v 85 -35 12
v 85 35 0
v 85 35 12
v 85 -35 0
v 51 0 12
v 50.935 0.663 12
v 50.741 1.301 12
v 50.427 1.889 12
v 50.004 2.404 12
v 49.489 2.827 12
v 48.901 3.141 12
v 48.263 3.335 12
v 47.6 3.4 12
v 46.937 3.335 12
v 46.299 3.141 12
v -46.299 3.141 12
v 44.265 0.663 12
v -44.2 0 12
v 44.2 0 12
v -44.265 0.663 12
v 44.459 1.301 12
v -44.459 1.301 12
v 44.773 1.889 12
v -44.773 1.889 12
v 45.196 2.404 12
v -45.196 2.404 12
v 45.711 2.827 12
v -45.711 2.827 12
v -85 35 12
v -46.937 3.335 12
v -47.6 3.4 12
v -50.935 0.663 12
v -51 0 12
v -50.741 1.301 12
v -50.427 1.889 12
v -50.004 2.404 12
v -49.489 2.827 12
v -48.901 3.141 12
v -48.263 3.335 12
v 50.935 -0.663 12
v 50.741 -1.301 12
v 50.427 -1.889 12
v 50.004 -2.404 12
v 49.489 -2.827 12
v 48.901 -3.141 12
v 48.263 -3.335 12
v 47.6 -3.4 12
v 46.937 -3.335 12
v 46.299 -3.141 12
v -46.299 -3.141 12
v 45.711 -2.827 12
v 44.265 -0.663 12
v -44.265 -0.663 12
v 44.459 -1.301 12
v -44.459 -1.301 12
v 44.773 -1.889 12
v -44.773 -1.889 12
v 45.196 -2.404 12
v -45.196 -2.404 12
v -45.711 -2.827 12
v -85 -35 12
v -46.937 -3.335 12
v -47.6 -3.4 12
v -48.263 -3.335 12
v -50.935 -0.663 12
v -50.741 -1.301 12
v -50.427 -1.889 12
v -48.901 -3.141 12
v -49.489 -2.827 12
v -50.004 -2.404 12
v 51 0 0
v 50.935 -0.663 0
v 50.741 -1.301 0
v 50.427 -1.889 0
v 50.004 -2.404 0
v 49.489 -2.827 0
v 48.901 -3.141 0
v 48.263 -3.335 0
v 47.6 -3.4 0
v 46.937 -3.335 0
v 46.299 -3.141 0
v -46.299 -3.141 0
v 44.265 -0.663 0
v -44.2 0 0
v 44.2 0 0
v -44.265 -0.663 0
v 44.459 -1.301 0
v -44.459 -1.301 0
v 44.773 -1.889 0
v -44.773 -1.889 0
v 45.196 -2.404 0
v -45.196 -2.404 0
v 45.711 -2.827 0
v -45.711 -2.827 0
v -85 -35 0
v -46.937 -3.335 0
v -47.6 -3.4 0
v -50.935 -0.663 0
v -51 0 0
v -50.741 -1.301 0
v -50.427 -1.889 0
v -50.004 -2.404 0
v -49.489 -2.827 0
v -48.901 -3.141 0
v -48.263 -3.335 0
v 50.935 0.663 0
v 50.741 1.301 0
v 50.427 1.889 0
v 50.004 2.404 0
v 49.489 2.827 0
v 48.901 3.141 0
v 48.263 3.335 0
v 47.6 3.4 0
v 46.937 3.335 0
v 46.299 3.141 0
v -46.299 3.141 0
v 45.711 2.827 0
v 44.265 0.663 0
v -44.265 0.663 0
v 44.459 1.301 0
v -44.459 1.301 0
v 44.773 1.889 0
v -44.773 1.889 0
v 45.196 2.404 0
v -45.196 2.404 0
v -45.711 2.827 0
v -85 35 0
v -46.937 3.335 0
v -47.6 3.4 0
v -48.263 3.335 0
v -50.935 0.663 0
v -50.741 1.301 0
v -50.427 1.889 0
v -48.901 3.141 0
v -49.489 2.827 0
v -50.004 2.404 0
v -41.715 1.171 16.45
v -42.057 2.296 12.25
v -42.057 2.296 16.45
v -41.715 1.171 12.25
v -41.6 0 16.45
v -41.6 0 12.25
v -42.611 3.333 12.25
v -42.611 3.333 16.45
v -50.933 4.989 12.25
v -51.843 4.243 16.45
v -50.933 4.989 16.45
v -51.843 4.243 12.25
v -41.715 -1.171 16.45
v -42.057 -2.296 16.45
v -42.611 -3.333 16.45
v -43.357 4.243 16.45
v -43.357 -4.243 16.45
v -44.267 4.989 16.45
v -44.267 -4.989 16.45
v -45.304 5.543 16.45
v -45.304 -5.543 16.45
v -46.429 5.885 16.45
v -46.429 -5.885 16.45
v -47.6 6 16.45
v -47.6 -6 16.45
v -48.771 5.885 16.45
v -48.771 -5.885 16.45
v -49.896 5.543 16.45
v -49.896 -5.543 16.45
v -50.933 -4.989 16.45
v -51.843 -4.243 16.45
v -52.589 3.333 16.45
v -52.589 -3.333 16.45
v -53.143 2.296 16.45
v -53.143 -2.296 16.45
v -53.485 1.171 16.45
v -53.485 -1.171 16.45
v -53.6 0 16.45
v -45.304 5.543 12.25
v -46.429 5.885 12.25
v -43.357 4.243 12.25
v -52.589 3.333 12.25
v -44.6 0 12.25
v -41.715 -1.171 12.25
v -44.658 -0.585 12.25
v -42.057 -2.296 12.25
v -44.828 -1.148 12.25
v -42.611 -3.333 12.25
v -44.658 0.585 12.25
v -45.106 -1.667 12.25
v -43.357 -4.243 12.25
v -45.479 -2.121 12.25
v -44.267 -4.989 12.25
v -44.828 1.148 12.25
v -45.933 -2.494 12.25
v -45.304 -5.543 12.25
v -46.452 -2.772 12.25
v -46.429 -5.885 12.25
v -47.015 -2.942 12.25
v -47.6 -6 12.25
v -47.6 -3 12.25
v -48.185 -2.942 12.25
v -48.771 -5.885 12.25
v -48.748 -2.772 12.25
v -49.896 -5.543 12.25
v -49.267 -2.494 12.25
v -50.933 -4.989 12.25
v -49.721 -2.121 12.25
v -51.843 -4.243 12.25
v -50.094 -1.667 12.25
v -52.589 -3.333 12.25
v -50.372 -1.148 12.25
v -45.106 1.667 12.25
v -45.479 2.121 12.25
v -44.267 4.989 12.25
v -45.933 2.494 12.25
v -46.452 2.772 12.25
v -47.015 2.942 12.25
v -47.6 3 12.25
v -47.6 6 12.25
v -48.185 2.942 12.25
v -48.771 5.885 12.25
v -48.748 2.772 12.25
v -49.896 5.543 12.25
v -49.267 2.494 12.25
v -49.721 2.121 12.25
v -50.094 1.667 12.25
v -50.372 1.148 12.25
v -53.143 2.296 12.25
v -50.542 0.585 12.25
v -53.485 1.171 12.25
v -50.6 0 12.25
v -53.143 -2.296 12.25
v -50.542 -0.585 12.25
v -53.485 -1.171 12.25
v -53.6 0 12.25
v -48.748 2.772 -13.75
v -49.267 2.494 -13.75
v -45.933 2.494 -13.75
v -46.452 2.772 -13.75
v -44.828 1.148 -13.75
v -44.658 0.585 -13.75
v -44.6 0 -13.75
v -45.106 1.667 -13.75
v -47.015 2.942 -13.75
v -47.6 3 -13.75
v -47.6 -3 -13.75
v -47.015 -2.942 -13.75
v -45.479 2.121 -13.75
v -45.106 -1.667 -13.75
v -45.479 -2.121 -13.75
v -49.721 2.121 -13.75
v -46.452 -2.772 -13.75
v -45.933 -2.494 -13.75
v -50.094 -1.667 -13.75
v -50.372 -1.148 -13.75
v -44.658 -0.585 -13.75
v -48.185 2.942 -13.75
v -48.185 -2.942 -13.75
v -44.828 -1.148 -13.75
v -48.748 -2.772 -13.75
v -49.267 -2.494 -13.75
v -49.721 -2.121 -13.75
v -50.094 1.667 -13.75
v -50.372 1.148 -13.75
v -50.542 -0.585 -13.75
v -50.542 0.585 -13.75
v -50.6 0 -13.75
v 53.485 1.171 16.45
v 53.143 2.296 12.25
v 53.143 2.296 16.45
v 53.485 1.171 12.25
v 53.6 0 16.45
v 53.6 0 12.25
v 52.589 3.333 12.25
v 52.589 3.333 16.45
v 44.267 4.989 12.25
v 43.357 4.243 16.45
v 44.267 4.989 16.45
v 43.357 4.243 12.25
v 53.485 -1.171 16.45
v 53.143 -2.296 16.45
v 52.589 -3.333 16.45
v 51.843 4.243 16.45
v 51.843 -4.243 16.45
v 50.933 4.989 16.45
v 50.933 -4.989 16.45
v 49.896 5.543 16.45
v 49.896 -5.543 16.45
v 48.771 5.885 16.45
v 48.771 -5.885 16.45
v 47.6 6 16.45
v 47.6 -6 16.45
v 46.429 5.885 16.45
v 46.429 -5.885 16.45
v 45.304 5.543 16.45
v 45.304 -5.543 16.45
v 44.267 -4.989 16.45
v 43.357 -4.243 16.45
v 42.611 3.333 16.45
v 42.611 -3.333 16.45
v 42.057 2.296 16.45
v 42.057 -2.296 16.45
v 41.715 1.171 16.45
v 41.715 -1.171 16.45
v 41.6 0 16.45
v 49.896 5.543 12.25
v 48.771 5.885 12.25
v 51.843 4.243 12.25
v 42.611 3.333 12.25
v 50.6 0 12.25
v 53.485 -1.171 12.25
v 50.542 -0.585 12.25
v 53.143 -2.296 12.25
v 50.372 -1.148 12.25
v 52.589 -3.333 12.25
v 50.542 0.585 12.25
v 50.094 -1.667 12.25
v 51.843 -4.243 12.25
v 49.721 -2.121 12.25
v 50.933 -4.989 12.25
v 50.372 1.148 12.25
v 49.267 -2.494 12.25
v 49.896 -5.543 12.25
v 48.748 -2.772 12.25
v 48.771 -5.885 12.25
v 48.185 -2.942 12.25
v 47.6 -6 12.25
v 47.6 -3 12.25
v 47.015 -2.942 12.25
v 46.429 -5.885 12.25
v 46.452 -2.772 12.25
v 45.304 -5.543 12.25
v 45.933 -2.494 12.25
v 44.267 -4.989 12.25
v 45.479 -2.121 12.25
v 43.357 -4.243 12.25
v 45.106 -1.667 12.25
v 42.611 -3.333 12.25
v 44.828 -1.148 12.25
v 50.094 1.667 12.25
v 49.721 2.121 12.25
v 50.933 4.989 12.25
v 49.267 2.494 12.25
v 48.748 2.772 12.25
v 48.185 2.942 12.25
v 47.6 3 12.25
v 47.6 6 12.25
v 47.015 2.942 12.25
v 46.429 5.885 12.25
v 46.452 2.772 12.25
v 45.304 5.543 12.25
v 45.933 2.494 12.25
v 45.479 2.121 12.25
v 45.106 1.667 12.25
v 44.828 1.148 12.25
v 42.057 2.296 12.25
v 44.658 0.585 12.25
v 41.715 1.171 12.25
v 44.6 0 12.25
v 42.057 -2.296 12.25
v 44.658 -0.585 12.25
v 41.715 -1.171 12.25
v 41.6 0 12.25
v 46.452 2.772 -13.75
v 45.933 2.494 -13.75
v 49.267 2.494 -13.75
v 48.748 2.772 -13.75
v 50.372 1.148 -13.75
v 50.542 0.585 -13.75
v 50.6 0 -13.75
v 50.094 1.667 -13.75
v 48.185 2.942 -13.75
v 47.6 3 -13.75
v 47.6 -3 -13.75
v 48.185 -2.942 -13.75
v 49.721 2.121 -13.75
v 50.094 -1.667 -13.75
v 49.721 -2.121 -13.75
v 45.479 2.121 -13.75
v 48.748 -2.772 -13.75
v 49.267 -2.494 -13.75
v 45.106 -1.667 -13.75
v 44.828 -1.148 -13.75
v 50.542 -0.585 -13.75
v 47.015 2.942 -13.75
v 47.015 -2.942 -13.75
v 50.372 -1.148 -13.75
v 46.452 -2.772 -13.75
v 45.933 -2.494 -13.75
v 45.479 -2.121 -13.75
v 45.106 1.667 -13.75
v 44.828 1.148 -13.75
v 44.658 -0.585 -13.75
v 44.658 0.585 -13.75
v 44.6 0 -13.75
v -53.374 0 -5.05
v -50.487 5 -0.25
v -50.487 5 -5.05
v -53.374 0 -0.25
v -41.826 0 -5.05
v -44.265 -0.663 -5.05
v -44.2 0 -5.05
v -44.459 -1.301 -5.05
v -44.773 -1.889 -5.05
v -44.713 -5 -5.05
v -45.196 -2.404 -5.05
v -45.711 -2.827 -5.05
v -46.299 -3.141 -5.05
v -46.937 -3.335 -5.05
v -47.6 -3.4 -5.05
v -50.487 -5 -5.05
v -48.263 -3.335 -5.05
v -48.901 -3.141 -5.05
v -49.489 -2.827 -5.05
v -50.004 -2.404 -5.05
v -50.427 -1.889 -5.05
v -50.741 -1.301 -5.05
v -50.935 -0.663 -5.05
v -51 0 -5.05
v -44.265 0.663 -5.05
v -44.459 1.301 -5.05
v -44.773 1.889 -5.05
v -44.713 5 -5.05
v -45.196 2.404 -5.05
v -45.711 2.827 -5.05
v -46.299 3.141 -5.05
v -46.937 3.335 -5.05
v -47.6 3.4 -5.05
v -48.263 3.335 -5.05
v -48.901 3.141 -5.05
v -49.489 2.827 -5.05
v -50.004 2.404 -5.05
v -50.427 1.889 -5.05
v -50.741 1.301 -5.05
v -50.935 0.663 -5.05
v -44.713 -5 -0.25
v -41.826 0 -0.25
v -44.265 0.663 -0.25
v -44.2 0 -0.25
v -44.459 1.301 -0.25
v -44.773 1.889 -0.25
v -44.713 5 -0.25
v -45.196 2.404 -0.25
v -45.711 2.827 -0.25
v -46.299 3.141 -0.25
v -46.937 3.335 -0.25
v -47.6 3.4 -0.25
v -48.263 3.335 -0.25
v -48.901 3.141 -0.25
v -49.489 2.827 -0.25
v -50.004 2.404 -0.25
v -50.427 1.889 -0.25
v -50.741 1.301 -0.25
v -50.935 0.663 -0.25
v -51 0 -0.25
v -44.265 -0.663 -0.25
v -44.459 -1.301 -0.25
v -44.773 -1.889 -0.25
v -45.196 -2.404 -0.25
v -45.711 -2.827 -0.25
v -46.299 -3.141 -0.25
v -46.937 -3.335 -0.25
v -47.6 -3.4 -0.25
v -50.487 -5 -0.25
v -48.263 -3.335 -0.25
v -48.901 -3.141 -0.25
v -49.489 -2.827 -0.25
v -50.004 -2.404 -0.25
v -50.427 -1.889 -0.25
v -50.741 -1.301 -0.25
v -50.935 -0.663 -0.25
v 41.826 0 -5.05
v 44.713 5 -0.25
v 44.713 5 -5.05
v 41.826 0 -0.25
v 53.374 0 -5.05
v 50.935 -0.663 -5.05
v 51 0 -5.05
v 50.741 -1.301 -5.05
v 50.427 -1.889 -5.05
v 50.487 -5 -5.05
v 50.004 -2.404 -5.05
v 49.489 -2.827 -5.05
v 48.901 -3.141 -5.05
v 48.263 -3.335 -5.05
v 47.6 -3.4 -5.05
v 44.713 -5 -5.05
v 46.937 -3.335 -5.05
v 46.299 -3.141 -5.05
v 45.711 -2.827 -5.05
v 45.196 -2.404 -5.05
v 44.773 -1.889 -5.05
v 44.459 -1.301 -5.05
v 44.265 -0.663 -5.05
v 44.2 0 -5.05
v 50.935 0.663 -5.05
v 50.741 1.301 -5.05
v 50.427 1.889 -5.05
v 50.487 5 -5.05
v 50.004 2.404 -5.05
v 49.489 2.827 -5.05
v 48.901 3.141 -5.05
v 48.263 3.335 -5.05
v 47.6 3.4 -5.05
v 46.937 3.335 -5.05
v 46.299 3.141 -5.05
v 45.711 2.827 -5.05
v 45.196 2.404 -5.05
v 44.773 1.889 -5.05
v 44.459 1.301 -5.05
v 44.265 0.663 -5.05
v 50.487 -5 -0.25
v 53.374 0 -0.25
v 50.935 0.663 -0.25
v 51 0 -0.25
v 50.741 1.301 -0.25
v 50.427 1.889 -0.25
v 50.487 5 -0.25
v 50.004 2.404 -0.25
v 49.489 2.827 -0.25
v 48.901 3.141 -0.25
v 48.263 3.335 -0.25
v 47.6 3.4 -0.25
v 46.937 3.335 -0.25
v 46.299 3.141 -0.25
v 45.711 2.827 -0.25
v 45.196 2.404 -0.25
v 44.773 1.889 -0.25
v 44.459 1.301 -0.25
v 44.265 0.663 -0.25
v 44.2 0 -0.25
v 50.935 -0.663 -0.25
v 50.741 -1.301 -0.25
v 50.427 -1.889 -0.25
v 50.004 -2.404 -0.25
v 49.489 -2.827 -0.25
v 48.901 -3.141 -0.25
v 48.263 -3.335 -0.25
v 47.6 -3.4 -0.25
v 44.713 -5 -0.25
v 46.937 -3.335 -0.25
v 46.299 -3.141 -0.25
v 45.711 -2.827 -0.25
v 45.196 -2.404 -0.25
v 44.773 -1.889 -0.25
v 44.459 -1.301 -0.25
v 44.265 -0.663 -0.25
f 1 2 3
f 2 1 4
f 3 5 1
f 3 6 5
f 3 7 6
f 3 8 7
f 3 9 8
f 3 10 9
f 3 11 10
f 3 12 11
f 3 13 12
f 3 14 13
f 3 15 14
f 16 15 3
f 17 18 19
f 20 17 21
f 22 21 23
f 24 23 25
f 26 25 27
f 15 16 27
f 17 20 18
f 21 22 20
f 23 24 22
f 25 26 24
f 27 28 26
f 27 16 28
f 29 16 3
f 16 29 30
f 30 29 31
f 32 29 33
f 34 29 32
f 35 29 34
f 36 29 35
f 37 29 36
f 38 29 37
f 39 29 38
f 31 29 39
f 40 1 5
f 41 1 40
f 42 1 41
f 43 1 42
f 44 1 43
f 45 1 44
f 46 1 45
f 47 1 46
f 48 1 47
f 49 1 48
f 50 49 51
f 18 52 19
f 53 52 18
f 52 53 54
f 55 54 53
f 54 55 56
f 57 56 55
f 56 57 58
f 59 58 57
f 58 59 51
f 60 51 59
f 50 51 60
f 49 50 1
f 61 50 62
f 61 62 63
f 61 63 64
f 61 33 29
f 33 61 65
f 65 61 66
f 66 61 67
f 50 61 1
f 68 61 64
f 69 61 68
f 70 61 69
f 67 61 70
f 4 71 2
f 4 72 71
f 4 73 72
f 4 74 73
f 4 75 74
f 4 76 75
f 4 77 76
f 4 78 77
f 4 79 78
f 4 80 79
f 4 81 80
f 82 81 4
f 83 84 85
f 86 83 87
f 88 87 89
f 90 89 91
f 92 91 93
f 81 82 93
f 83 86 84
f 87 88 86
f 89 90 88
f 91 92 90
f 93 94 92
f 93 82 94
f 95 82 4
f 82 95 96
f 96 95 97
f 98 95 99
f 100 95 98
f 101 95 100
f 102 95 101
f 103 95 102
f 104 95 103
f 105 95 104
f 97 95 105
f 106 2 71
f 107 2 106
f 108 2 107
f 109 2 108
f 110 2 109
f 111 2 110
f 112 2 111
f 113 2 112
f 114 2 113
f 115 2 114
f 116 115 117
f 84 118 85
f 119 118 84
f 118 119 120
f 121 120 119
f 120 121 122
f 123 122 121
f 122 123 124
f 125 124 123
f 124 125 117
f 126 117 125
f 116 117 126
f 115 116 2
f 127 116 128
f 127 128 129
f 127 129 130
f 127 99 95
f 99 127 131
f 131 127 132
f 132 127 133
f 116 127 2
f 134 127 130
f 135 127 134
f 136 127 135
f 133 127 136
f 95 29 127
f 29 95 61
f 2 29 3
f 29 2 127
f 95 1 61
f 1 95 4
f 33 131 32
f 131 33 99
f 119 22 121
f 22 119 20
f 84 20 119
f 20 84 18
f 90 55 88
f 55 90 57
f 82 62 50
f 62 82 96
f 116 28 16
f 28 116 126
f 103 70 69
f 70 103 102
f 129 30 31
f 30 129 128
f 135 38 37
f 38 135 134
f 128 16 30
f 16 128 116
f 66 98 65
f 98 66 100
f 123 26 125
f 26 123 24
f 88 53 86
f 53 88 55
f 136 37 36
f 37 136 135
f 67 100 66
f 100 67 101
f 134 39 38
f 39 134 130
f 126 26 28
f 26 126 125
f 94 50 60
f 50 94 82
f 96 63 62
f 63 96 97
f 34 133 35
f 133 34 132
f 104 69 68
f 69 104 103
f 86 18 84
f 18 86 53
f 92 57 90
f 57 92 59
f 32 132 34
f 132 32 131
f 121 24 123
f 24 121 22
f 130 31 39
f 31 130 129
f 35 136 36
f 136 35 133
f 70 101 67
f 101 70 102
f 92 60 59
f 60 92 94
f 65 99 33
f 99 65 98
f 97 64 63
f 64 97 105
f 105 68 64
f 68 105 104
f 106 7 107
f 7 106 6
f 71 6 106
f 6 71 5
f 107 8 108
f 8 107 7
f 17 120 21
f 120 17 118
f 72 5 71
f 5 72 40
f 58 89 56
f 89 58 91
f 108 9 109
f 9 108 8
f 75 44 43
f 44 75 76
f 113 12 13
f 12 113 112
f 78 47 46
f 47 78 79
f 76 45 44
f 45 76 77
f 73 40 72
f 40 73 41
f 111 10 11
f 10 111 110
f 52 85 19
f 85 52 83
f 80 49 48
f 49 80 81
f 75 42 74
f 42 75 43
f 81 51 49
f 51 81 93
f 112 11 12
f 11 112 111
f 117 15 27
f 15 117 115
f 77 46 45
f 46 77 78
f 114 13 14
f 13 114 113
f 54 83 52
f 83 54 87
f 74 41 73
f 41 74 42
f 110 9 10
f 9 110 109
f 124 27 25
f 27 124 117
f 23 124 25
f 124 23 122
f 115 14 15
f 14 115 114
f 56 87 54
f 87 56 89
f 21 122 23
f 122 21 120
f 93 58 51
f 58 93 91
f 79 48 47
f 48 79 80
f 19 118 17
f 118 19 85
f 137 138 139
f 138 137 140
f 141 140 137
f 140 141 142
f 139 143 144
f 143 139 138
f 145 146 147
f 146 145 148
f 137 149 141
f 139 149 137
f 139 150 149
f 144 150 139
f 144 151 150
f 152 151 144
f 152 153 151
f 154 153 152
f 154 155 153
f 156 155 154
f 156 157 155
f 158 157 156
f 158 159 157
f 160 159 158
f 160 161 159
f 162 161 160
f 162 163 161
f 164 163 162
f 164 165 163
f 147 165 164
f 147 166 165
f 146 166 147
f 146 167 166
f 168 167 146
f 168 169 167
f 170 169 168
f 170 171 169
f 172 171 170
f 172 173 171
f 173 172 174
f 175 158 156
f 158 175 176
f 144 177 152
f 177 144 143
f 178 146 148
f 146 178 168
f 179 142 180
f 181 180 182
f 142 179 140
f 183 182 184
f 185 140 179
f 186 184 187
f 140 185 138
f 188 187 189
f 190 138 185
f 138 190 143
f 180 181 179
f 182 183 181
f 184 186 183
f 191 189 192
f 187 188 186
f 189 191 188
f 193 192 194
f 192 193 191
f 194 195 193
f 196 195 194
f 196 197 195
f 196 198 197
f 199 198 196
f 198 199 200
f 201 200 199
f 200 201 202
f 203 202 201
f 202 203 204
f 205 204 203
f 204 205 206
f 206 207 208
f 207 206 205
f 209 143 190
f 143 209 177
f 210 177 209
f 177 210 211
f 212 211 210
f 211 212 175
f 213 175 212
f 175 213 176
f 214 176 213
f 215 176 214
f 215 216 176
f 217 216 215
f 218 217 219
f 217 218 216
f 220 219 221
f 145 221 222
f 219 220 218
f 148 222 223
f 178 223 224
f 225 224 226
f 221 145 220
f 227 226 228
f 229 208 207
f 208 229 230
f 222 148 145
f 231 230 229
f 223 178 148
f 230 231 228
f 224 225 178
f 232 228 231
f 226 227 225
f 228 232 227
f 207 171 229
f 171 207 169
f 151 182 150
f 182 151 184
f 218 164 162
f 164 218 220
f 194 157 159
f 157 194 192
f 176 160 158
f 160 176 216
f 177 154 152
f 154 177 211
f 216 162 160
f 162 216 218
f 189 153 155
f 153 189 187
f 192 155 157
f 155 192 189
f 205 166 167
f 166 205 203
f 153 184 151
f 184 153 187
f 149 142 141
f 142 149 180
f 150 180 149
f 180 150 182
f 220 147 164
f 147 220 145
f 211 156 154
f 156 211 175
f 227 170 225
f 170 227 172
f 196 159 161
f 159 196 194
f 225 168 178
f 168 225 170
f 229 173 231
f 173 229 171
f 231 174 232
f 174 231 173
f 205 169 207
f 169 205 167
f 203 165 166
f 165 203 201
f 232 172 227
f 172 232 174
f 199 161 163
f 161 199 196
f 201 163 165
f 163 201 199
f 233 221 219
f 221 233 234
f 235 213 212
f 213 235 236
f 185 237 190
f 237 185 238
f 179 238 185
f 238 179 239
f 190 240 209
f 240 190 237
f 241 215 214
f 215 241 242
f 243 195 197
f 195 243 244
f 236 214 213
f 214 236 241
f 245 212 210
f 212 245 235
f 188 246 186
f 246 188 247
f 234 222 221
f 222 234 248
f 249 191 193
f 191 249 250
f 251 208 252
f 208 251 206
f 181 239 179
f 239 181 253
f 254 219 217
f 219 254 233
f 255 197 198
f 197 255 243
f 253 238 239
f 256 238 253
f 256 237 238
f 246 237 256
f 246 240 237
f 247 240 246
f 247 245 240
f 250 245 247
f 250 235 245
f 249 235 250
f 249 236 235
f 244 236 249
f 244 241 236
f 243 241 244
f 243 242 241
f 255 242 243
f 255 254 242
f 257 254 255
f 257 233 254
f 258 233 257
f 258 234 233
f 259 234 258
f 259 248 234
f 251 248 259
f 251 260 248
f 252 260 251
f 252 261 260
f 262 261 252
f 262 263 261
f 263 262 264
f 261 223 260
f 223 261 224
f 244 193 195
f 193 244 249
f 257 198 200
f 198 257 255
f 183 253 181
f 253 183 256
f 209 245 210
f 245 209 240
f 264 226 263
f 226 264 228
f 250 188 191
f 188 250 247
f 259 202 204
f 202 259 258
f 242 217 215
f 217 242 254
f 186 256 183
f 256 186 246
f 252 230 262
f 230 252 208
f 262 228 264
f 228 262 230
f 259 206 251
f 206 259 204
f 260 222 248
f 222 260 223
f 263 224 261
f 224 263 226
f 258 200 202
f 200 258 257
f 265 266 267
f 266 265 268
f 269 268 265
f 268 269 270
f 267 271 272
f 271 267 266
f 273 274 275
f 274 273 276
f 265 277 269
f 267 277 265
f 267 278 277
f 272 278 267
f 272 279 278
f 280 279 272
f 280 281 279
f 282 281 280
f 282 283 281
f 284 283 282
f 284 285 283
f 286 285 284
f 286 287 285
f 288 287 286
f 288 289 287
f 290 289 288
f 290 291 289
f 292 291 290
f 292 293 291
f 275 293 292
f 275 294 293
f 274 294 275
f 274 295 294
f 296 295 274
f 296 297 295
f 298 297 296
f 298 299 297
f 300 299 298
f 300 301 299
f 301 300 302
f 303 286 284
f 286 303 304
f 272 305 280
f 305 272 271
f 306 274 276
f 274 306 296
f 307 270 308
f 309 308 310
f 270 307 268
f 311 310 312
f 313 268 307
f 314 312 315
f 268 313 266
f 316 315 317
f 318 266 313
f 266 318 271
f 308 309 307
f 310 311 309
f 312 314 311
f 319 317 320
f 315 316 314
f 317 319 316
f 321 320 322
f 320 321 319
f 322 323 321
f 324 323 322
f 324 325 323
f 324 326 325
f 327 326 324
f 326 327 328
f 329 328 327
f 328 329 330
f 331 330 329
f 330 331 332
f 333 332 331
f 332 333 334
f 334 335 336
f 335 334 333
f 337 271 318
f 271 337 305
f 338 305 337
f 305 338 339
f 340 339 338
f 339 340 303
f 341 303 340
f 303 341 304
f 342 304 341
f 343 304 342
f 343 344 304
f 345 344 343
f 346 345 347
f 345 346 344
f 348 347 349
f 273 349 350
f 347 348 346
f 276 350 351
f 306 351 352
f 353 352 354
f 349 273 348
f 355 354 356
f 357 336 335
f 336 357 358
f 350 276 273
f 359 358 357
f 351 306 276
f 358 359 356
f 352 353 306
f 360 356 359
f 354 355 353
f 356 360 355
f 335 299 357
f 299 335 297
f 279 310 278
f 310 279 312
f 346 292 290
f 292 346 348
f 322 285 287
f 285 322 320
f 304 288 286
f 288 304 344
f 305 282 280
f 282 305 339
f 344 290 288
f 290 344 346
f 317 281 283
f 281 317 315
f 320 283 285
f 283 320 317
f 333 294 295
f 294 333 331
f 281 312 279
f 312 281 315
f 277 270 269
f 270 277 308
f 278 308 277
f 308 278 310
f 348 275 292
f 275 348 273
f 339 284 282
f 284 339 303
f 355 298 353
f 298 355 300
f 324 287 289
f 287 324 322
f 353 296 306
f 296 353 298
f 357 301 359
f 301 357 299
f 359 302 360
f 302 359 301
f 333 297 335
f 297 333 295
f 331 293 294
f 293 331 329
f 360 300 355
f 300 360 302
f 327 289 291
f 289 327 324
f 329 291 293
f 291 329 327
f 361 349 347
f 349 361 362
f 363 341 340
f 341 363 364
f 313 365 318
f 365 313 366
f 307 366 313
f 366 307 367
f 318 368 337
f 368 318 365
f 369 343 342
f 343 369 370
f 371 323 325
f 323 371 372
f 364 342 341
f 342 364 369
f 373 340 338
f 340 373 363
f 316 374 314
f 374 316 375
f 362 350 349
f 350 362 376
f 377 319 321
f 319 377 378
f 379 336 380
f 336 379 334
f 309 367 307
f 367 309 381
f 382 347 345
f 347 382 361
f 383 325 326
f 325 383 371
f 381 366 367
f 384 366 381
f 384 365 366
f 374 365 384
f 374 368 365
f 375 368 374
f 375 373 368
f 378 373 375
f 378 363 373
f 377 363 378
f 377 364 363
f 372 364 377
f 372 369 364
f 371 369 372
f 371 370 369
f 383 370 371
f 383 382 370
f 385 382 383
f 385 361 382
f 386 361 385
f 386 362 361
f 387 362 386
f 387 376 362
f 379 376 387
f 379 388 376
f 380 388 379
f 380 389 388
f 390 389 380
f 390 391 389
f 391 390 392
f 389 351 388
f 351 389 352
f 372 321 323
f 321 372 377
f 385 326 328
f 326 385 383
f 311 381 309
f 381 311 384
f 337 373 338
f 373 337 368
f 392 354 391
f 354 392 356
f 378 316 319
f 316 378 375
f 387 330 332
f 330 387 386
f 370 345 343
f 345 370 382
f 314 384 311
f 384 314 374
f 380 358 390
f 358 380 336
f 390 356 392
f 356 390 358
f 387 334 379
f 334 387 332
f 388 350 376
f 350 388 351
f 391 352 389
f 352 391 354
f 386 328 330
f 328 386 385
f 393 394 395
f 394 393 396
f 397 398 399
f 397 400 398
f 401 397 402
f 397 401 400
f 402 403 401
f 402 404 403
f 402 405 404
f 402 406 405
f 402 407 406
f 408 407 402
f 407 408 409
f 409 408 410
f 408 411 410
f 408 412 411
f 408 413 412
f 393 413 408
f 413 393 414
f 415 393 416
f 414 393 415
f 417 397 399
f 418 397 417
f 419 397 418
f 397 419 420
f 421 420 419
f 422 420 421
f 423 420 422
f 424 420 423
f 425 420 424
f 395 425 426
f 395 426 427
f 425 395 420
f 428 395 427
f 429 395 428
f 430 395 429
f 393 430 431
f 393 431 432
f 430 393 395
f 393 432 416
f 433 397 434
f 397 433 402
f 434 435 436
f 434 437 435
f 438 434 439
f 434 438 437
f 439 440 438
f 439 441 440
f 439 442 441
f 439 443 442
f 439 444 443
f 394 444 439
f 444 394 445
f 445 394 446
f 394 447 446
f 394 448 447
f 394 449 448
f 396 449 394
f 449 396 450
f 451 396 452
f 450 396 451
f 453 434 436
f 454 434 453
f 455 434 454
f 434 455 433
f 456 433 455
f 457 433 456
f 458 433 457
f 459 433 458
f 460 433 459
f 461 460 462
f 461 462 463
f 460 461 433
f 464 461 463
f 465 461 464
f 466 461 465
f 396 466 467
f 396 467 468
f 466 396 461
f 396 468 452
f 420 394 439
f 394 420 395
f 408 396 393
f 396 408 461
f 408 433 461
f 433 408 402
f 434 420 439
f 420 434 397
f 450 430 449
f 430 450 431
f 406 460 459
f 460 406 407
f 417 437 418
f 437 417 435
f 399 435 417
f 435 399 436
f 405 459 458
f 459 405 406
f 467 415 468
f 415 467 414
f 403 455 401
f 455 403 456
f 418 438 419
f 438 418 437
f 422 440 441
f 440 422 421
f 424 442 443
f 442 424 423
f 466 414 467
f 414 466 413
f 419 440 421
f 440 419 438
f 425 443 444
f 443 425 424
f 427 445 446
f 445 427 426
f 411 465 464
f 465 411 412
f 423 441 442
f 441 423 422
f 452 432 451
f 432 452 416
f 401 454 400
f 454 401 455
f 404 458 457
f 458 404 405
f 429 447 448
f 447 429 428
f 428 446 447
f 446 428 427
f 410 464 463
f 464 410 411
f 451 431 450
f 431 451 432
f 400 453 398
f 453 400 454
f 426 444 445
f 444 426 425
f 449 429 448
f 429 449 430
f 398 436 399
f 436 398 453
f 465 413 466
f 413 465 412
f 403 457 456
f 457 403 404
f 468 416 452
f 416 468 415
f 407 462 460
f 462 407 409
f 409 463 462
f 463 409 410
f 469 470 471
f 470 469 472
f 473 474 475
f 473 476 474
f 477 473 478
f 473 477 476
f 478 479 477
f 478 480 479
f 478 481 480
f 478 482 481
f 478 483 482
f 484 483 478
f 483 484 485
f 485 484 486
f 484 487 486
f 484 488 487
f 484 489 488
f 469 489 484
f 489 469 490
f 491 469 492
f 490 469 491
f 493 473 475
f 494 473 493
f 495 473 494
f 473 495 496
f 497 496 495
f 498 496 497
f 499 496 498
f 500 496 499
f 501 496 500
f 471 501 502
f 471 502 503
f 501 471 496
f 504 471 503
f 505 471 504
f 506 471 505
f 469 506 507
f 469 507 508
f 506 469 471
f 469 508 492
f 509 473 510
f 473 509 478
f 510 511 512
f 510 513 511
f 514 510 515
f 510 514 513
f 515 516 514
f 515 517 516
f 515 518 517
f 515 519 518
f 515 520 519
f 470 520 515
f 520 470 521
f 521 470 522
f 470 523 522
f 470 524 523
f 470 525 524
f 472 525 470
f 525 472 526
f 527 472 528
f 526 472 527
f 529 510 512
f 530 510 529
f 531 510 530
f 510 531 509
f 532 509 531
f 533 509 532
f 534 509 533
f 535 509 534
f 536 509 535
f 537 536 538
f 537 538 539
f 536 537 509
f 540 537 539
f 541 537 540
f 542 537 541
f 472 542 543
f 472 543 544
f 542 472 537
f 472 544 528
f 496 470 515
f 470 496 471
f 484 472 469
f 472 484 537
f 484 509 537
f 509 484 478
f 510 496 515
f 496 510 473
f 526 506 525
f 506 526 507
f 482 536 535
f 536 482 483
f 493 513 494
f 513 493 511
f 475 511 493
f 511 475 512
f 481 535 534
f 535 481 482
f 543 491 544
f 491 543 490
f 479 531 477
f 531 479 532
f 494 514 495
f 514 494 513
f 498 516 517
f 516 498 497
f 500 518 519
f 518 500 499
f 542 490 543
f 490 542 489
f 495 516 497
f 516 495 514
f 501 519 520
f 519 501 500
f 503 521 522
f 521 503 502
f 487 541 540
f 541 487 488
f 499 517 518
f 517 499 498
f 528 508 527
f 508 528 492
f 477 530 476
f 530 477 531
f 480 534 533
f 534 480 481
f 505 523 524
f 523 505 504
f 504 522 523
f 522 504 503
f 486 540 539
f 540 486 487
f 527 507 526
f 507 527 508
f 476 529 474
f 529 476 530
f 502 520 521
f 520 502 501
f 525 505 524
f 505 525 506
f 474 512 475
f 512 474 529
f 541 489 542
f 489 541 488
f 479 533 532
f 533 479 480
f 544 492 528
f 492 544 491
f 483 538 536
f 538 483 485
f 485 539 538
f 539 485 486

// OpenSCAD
$fn = 32;

// ------------------------------------------------------------------------
// Bolted plate: 170 x 70 x 12 mm plate, 2 fasteners
// Every part is its own module, assembly() places them once.
// ------------------------------------------------------------------------

// --- part 1 ---
module plate() {
  difference() {
    translate([-85, -35, 0]) cube([170, 70, 12]);
    translate([-47.6, 0, -1]) cylinder(h = 14, d = 6.8);
    translate([47.6, 0, -1]) cylinder(h = 14, d = 6.8);
  }
}

// --- part 2 ---
module bolt1() {
  cylinder(h = 4.2, d = 12);
  translate([0, 0, -26]) cylinder(h = 26, d = 6);
}

// --- part 3 ---
module bolt2() {
  cylinder(h = 4.2, d = 12);
  translate([0, 0, -26]) cylinder(h = 26, d = 6);
}

// --- part 4 ---
module nut1() {
  difference() {
    linear_extrude(height = 4.8) polygon(points = [[5.774, 0], [2.887, 5], [-2.887, 5], [-5.774, 0], [-2.887, -5], [2.887, -5]]);
    translate([0, 0, -1]) cylinder(h = 6.8, d = 6.8);
  }
}

// --- part 5 ---
module nut2() {
  difference() {
    linear_extrude(height = 4.8) polygon(points = [[5.774, 0], [2.887, 5], [-2.887, 5], [-5.774, 0], [-2.887, -5], [2.887, -5]]);
    translate([0, 0, -1]) cylinder(h = 6.8, d = 6.8);
  }
}

// --- assembly ---
module assembly() {
  translate([0, 0, 0]) rotate([0, 0, 0]) plate();
  translate([-47.6, 0, 12.25]) rotate([0, 0, 0]) bolt1();
  translate([47.6, 0, 12.25]) rotate([0, 0, 0]) bolt2();
  translate([-47.6, 0, -5.05]) rotate([0, 0, 0]) nut1();
  translate([47.6, 0, -5.05]) rotate([0, 0, 0]) nut2();
}

assembly();
